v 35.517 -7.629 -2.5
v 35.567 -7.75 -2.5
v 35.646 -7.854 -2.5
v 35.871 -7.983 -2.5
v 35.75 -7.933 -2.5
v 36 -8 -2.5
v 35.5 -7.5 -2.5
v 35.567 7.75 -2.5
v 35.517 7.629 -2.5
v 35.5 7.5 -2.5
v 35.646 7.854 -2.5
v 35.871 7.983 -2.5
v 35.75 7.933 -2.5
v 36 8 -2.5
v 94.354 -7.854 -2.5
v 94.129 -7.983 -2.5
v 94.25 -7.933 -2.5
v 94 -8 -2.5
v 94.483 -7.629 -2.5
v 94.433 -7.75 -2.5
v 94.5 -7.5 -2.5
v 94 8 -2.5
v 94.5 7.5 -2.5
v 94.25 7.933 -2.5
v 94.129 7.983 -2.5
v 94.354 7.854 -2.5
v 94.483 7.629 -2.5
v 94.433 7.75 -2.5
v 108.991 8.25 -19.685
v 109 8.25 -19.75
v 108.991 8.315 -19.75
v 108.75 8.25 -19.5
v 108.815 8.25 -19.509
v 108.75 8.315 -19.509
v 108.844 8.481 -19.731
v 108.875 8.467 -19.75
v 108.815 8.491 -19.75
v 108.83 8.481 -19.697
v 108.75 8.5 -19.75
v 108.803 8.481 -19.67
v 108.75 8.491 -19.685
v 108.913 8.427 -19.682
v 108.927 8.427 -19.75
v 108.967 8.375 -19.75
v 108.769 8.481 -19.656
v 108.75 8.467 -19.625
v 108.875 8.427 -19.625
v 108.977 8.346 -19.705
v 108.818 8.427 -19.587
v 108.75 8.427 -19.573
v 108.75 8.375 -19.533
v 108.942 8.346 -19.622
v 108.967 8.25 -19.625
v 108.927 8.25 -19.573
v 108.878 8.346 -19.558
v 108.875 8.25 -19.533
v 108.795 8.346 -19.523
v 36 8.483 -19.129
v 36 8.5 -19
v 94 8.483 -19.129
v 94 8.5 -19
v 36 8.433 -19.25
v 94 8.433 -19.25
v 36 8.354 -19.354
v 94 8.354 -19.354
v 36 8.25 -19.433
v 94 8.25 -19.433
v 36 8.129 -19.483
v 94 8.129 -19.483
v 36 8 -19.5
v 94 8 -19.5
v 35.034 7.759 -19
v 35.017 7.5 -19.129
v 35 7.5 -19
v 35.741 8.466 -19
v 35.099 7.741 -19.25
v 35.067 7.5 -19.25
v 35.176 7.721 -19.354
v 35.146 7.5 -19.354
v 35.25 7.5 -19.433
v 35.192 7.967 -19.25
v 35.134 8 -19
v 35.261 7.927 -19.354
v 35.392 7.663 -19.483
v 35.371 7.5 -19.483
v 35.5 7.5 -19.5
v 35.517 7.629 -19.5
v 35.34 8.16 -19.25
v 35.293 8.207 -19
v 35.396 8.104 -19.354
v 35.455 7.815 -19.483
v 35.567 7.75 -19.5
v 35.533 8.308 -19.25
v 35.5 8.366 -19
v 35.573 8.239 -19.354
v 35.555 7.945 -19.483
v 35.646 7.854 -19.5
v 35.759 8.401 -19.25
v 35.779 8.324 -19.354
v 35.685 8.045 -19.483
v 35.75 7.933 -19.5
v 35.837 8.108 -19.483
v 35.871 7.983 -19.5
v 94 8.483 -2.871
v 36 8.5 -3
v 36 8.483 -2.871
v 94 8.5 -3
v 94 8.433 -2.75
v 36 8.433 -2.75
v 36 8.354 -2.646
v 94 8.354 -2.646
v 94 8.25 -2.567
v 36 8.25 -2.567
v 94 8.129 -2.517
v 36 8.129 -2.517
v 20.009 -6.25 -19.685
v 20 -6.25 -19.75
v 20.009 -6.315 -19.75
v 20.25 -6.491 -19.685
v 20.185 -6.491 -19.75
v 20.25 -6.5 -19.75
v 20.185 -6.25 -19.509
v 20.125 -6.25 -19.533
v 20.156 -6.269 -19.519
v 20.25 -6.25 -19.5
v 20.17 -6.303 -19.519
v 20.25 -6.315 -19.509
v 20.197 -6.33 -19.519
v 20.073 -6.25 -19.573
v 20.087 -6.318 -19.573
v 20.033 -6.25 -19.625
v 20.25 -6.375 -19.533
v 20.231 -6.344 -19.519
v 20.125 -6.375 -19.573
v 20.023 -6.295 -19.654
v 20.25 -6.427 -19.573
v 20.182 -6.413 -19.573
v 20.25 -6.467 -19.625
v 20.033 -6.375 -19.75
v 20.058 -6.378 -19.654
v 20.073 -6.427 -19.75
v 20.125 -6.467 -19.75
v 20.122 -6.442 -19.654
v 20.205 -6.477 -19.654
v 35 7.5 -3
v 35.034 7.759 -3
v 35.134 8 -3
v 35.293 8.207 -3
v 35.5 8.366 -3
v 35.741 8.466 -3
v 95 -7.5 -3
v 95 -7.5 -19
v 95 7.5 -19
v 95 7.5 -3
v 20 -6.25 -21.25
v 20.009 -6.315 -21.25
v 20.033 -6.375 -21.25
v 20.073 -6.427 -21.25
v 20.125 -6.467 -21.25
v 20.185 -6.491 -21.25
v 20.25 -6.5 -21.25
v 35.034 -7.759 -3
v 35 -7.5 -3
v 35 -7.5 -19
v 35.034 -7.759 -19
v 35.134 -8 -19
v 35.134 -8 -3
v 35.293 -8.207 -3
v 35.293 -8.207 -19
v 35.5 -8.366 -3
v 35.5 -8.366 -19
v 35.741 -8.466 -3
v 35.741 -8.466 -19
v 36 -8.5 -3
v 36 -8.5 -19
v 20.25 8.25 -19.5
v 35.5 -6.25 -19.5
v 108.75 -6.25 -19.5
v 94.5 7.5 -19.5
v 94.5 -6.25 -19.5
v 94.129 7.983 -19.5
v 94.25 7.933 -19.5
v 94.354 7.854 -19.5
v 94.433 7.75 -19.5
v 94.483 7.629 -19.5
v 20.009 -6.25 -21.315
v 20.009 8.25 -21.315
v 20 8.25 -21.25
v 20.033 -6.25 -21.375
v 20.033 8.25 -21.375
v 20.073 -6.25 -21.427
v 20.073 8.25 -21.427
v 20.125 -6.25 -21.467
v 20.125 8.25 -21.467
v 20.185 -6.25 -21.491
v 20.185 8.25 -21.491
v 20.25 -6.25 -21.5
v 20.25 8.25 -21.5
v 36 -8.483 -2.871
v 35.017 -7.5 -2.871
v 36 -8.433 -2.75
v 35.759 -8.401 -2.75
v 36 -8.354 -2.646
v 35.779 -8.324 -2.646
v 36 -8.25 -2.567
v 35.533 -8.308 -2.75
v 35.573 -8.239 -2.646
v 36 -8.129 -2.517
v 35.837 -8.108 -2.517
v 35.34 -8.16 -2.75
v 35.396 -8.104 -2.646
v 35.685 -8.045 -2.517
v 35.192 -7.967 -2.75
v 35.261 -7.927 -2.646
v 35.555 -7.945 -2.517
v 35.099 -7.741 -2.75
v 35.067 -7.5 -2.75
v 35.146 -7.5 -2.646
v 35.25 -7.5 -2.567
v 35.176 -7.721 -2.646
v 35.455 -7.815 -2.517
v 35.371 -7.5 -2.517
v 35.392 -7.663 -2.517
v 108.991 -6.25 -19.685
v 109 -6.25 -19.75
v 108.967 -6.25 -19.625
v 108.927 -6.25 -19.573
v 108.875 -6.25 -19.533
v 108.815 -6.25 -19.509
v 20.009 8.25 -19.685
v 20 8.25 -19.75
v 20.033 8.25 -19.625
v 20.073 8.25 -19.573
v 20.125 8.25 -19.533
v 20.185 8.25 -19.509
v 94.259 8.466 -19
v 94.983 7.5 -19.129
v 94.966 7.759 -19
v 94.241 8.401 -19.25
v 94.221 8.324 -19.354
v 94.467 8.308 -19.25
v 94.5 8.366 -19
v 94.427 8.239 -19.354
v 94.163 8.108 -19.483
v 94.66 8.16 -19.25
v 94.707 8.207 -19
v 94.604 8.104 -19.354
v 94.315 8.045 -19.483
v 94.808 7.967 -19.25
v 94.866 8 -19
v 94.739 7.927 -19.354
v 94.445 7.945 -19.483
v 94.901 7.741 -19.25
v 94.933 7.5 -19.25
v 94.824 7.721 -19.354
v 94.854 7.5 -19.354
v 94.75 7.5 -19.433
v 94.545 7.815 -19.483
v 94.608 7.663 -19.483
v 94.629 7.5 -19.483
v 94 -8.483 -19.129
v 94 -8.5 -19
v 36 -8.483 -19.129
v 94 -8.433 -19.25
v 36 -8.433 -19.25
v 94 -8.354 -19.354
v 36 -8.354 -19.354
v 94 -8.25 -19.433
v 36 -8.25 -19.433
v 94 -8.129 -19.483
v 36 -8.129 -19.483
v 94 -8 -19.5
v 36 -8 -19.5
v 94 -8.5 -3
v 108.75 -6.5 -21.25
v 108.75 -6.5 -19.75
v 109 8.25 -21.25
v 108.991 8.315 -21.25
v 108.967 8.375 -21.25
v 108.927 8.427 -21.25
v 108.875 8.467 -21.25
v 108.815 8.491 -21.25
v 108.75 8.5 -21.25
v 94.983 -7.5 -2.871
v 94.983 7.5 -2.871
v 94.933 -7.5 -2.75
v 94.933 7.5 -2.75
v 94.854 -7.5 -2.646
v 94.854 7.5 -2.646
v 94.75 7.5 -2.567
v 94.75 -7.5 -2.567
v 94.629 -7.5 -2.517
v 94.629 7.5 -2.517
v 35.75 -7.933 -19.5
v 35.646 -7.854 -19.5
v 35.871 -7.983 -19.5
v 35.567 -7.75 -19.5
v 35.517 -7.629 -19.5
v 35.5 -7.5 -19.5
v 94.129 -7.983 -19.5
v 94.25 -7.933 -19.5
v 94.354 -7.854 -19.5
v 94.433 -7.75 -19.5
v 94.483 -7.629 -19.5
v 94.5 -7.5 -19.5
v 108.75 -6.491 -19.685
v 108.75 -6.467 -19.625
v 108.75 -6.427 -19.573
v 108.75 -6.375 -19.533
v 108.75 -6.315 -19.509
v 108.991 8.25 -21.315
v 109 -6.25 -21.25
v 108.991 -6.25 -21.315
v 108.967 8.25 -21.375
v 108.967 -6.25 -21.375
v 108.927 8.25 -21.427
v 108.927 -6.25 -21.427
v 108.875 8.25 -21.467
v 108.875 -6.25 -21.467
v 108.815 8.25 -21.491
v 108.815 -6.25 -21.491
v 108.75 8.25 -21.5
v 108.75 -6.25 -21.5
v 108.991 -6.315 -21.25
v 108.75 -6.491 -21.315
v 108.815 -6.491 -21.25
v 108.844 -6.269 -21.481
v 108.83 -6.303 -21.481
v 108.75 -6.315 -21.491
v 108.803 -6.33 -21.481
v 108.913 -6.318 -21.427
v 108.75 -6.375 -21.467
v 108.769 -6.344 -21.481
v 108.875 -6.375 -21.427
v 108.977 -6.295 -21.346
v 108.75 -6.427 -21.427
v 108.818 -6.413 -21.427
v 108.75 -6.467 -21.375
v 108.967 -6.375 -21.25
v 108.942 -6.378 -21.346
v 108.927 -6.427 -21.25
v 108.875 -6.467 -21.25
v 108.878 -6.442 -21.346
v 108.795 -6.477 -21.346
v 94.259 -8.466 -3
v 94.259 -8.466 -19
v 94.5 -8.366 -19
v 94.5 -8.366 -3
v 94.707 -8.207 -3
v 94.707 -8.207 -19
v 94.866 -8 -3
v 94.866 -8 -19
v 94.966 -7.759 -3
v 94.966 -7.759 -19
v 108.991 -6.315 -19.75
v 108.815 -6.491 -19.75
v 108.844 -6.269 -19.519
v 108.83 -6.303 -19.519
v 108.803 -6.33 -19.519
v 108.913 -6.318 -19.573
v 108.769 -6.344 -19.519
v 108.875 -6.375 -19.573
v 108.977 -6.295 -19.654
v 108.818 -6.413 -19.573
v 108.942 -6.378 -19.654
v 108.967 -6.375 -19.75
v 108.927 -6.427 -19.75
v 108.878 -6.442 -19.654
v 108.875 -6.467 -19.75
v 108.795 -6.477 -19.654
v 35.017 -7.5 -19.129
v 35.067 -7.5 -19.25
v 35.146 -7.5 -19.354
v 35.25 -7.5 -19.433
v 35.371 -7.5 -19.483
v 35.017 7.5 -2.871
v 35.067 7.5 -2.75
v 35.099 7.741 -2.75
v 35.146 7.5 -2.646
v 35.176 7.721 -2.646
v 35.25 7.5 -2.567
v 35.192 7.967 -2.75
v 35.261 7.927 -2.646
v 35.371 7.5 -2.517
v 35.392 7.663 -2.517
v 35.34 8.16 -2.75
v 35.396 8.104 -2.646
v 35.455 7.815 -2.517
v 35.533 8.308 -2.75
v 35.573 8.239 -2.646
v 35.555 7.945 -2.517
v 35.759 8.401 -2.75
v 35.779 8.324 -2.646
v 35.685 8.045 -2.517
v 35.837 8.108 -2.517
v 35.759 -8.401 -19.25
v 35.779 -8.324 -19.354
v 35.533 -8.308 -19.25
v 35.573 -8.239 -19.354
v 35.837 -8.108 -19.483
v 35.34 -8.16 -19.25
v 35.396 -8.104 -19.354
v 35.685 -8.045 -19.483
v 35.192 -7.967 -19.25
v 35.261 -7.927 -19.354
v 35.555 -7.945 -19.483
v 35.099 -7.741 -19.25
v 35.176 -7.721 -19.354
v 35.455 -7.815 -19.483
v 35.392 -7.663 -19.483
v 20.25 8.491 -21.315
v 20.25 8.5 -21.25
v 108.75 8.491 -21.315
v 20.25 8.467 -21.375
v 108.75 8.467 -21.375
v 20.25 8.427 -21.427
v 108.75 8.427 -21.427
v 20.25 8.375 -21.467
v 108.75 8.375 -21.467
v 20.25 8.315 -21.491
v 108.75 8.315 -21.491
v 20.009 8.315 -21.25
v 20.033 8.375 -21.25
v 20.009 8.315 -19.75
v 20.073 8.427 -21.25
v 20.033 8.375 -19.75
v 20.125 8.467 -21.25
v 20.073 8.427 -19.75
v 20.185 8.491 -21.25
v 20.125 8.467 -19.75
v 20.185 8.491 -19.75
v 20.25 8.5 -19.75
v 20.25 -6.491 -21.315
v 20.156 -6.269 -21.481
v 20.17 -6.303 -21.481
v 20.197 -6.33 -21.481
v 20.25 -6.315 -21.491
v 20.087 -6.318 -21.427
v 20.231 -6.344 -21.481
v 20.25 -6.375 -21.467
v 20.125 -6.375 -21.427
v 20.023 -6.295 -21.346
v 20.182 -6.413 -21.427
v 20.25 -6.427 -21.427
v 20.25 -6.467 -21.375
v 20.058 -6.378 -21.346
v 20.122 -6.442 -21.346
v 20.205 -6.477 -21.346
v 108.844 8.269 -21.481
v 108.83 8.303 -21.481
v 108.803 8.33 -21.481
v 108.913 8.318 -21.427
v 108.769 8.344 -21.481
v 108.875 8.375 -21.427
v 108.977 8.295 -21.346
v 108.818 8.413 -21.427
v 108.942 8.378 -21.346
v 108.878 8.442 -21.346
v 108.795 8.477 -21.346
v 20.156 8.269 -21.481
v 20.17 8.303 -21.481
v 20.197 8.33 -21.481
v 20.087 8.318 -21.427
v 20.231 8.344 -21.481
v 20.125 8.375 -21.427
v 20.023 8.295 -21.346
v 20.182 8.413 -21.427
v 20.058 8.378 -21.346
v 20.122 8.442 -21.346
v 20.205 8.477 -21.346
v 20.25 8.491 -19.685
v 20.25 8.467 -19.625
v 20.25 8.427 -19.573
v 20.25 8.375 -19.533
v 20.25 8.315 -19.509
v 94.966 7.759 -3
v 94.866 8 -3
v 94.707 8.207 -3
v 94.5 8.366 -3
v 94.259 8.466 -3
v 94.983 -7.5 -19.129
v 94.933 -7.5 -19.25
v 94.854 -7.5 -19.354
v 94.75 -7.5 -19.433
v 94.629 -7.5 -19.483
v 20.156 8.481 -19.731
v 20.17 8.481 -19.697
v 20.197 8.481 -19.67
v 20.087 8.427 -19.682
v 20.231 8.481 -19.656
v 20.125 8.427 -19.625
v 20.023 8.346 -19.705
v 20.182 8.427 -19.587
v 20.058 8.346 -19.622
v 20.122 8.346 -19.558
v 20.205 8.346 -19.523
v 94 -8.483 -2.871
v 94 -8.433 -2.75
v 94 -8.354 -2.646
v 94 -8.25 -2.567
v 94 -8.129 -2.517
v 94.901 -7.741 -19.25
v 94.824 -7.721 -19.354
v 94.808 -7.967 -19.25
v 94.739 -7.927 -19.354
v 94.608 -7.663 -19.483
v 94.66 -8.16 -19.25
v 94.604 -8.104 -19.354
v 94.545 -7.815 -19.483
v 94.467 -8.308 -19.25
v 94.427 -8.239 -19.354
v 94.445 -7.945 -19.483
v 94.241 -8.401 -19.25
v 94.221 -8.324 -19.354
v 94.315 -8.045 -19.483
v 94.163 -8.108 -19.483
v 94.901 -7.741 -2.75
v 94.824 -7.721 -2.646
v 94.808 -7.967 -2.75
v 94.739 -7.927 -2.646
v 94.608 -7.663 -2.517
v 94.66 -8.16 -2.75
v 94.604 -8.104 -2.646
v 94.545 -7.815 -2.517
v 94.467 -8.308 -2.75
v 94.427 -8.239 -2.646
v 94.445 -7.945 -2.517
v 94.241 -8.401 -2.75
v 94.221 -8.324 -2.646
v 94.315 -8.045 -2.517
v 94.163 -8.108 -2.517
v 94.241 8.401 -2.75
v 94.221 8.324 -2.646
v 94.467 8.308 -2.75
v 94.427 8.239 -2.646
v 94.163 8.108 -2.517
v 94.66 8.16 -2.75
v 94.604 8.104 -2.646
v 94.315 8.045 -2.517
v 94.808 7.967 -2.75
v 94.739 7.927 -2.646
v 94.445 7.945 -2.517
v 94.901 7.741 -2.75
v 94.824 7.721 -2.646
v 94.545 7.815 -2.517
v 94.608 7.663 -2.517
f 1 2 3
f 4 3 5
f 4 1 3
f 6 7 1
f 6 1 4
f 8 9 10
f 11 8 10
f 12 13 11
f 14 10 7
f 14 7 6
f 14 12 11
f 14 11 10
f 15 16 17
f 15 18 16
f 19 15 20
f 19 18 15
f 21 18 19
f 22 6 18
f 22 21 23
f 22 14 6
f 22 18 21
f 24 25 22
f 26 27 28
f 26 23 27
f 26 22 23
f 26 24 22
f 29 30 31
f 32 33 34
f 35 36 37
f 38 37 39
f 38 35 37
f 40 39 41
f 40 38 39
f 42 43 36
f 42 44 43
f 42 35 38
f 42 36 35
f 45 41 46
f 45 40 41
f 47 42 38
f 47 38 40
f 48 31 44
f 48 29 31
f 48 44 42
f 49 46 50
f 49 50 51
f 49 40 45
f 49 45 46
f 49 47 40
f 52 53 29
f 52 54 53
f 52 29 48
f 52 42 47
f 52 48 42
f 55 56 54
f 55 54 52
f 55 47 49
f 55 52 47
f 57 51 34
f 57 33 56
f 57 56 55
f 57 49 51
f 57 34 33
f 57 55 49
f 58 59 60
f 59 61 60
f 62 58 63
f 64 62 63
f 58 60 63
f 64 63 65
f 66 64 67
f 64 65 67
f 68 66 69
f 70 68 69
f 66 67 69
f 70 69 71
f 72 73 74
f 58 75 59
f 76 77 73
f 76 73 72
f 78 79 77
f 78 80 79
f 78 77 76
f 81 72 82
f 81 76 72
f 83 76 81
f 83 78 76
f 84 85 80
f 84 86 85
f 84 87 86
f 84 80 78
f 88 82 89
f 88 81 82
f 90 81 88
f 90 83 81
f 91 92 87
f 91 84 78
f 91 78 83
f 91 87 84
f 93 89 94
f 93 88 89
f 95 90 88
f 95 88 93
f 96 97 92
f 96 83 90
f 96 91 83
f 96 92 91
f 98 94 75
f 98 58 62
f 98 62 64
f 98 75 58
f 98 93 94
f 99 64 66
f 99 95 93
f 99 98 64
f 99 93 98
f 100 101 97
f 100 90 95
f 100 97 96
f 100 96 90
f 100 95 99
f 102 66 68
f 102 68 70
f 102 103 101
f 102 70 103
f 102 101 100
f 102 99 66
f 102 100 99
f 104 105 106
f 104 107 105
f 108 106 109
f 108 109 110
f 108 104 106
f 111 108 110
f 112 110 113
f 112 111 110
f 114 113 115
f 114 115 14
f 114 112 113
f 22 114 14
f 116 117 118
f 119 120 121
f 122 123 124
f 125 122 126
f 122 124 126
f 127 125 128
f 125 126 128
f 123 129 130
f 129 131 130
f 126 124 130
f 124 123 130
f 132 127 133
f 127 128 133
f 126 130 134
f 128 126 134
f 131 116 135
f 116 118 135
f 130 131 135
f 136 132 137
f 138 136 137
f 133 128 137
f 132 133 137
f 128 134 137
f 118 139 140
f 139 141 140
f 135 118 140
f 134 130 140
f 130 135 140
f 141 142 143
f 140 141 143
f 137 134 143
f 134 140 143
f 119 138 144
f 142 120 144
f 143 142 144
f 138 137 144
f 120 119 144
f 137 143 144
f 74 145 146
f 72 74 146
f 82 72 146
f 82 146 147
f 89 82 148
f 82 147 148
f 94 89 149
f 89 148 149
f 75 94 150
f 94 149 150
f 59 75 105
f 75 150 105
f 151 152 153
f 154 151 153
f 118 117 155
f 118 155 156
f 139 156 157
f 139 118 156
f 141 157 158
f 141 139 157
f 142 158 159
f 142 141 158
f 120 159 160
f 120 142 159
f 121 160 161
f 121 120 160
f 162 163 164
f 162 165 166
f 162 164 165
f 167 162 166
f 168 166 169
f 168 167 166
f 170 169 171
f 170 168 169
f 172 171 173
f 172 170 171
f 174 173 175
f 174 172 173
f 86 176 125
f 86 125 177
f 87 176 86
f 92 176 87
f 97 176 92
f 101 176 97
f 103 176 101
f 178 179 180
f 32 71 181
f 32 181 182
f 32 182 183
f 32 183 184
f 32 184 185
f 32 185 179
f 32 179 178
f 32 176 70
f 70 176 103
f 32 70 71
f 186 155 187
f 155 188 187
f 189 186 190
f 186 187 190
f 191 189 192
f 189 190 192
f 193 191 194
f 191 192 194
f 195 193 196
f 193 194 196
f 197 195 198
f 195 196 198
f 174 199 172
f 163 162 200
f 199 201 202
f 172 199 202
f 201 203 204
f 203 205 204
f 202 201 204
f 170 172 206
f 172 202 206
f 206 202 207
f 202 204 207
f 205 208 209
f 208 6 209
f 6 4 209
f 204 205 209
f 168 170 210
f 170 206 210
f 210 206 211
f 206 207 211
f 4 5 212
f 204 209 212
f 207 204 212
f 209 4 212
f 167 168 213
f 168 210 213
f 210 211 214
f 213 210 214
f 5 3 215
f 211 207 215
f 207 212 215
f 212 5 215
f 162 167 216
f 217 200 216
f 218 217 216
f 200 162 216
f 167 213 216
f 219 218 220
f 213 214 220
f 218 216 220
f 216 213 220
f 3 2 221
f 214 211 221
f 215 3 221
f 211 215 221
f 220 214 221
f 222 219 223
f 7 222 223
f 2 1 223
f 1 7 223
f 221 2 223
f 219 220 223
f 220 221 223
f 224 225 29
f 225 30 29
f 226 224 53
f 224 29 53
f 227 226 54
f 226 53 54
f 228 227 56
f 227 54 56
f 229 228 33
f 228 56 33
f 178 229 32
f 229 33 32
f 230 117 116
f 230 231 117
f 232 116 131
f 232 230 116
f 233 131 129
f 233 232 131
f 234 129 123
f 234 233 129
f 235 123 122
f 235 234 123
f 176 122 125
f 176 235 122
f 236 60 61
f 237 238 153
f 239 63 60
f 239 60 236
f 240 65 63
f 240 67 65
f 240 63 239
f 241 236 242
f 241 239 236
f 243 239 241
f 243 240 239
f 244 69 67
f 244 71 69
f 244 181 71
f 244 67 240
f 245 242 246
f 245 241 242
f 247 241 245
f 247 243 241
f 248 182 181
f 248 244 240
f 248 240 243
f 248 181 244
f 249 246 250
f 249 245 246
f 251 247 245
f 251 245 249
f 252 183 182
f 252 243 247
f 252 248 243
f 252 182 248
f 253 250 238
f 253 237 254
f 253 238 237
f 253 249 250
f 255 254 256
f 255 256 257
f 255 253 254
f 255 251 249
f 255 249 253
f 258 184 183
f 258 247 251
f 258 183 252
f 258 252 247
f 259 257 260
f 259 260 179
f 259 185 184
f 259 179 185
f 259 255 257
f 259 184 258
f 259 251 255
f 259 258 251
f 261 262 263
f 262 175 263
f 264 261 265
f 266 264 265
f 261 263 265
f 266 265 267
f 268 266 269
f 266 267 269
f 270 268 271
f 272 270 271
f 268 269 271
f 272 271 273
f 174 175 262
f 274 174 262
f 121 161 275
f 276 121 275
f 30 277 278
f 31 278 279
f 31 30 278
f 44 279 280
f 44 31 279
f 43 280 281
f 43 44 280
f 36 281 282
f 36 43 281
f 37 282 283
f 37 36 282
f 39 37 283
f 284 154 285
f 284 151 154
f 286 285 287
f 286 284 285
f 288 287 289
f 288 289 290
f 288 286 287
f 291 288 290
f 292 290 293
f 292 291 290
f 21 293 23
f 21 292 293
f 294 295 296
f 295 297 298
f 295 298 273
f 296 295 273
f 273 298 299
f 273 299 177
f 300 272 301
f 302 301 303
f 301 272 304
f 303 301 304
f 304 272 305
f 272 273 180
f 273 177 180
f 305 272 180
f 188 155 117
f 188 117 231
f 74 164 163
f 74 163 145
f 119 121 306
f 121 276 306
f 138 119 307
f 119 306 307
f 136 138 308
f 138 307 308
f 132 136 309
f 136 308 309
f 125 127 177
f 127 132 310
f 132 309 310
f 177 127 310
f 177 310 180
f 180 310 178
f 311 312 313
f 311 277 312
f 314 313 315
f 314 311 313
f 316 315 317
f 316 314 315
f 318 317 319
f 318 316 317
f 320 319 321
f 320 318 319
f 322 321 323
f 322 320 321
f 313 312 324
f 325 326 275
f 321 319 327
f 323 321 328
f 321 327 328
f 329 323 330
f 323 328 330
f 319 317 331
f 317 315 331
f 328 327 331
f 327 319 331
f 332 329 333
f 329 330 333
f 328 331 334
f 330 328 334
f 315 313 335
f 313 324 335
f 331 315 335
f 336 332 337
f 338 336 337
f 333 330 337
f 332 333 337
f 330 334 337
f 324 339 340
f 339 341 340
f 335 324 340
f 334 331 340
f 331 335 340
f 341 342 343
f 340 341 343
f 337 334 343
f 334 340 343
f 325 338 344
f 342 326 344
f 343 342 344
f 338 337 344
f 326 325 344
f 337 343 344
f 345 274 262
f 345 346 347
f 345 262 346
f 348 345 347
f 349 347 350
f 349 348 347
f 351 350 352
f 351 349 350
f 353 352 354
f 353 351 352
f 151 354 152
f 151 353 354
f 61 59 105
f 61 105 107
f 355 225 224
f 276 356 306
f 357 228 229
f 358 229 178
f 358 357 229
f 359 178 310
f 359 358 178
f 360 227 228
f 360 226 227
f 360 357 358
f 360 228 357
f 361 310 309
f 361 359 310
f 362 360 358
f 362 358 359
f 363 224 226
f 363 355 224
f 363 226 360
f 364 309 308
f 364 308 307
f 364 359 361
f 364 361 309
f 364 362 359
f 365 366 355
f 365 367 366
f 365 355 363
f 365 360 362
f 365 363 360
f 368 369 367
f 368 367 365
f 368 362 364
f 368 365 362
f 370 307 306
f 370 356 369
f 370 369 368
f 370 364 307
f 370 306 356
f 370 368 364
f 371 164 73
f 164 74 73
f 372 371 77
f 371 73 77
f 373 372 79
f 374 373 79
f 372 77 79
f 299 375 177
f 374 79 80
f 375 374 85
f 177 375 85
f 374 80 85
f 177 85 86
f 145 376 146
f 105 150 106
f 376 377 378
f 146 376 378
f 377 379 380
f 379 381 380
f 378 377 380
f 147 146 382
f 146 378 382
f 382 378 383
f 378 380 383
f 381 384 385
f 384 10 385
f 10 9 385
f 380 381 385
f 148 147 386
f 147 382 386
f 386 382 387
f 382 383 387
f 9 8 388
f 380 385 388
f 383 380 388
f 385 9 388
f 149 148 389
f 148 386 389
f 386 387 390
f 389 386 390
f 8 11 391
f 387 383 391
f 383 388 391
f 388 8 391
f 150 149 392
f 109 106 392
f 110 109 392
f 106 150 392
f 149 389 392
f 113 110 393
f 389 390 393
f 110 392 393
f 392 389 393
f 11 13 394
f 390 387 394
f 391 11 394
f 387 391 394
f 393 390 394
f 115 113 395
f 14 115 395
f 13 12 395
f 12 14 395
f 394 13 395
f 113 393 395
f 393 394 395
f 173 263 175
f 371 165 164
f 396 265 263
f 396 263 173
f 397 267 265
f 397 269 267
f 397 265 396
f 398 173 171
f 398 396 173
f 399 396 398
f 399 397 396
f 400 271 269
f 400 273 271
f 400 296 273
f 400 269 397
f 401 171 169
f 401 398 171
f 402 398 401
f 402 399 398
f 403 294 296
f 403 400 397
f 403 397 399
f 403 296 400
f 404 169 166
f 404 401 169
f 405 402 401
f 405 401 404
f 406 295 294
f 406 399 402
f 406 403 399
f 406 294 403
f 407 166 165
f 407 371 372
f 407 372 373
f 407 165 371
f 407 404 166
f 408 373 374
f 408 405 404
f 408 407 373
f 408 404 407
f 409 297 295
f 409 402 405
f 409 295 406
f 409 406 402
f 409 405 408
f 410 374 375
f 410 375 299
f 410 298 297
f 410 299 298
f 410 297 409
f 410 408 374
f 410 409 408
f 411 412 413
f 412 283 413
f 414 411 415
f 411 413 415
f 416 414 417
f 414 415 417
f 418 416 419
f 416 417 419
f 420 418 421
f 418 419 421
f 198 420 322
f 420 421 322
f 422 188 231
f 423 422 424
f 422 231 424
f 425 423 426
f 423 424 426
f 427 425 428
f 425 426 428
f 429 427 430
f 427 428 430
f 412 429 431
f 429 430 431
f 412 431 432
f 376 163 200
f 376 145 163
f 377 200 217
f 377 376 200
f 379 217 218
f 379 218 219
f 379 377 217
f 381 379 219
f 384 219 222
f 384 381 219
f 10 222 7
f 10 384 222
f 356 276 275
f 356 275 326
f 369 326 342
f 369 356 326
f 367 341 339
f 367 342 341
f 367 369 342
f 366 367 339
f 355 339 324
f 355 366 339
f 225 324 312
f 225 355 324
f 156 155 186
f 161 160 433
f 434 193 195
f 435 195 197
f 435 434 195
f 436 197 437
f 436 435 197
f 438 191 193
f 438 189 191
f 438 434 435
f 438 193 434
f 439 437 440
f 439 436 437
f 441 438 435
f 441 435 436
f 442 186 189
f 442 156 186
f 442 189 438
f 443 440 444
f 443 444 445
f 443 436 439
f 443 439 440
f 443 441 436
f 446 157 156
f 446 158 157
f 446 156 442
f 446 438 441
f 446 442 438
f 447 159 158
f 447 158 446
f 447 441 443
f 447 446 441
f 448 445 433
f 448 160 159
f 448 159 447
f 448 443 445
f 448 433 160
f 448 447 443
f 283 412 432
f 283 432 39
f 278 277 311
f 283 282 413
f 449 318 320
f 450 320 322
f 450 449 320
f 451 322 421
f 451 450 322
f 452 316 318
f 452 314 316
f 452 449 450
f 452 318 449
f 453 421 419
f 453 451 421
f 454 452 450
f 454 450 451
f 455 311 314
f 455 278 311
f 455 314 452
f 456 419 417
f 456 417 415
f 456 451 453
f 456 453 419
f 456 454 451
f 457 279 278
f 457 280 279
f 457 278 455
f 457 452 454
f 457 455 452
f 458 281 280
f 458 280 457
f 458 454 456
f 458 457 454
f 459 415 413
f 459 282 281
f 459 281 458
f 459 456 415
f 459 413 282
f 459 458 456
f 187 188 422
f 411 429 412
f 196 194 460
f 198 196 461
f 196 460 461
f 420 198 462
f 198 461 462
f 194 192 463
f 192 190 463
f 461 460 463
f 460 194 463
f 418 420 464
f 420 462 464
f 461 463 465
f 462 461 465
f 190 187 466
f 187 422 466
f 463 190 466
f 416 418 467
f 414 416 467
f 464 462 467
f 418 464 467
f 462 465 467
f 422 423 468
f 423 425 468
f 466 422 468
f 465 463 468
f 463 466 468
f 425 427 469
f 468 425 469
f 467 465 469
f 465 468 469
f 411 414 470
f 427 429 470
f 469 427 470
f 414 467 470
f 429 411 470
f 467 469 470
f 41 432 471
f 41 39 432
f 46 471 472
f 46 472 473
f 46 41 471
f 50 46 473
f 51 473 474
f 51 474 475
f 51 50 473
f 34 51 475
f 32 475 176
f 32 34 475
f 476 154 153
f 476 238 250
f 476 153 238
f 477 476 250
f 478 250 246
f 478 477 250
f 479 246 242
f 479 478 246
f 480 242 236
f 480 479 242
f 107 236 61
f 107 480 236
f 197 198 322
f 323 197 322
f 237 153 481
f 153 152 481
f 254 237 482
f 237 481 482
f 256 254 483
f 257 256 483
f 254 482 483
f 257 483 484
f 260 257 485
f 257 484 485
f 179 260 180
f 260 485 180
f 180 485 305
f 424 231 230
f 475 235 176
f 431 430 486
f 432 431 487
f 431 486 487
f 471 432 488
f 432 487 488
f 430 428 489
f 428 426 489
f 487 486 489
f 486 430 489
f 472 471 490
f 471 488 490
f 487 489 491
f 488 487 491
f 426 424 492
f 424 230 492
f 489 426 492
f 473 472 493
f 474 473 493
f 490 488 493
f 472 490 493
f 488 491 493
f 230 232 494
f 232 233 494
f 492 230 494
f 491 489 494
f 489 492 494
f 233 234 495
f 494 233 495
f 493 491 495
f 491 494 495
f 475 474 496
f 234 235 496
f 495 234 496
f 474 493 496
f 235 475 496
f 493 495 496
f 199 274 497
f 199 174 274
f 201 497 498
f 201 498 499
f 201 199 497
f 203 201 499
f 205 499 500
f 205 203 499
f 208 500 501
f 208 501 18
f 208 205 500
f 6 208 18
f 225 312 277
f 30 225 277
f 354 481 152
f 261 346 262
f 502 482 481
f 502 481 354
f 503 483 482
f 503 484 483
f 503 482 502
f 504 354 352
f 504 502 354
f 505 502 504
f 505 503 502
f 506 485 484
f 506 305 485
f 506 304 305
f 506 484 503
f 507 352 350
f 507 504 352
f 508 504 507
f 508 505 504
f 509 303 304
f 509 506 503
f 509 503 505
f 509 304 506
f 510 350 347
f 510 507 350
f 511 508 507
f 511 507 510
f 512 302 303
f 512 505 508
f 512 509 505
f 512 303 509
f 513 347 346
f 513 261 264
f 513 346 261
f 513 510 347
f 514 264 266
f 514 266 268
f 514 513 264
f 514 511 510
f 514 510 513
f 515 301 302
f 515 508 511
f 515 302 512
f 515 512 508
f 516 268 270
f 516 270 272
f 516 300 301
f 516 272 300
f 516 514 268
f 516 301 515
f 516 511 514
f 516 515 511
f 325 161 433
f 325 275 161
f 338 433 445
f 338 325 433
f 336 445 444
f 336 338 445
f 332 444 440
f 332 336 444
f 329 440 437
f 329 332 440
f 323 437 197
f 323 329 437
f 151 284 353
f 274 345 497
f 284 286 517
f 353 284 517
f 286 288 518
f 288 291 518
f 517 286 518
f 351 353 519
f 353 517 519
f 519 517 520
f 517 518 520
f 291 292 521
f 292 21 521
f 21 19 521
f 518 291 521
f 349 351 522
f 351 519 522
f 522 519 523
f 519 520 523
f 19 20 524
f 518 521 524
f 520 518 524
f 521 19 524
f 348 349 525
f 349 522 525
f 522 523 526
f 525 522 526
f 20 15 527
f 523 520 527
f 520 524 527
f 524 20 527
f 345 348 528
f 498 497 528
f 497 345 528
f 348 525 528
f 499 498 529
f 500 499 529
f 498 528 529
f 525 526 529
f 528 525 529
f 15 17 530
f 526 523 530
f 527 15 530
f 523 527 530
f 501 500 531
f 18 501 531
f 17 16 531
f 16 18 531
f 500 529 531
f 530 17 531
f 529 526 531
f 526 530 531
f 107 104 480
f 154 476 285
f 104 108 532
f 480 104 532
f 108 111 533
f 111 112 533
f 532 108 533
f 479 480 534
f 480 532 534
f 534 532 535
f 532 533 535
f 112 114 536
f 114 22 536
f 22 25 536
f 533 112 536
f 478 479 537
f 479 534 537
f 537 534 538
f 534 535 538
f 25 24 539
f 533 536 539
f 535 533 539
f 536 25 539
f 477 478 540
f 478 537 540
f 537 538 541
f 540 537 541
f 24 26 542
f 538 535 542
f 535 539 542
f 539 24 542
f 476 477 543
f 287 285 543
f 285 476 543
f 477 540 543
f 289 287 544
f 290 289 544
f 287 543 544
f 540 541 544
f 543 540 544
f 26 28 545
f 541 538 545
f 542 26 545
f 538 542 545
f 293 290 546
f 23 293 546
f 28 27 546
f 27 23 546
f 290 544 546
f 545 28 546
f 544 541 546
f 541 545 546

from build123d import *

# Parameters (mm, degrees)
BOX_W        = 60
BOX_H        = 17
BOX_DEPTH    = 17
FILLET001_R  = 1
FILLET002_R  = 0.5
BOX008_W     = 89
BOX008_H     = 15
BOX008_DEPTH = 2
FILLET003_R  = 0.25


with BuildPart() as vrm_cooler_body:
    # Box → Box (new body)
    with BuildSketch(Plane(origin=(0, -8.5, -17), x_dir=(1, 0, 0), z_dir=(0, 0, 1))):
        with Locations((30, 8.5)):
            Rectangle(BOX_W, BOX_H)
    extrude(amount=BOX_DEPTH)

    # Fillet001
    fillet001_edges = [vrm_cooler_body.edges().sort_by_distance(p)[0] for p in [
        (0, -8.5, -8.5),
        (0, 8.5, -8.5),
        (60, -8.5, -8.5),
        (60, 8.5, -8.5),
    ]]
    fillet(fillet001_edges, radius=FILLET001_R)

    # Fillet002
    fillet002_edges = [vrm_cooler_body.edges().sort_by_distance(p)[0] for p in [
        (0, 0, 0),
        (0, 0, -17),
        (30, -8.5, 0),
        (30, 8.5, 0),
        (60, 0, 0),
        (30, -8.5, -17),
        (30, 8.5, -17),
        (60, 0, -17),
    ]]
    fillet(fillet002_edges, radius=FILLET002_R)


with BuildPart() as vrm_cooler_body_1:
    # Fillet002 placement: moved
    add(vrm_cooler_body.part.moved(Location((35, 0, -2.5))))


with BuildPart() as fusion035:
    # Box008 → Box008 (new body)
    with BuildSketch(Plane(origin=(0, -6.5, -2), x_dir=(1, 0, 0), z_dir=(0, 0, 1))):
        with Locations((44.5, 7.5)):
            Rectangle(BOX008_W, BOX008_H)
    extrude(amount=BOX008_DEPTH)

    # Fillet003
    fillet003_edges = [fusion035.edges().sort_by_distance(p)[0] for p in [
        (0, -6.5, -1),
        (0, 1, 0),
        (0, 8.5, -1),
        (0, 1, -2),
        (89, -6.5, -1),
        (89, 1, 0),
        (89, 8.5, -1),
        (89, 1, -2),
        (44.5, -6.5, -2),
        (44.5, -6.5, 0),
        (44.5, 8.5, -2),
        (44.5, 8.5, 0),
    ]]
    fillet(fillet003_edges, radius=FILLET003_R)


with BuildPart() as fusion035_1:
    # Fillet003 placement: moved
    add(fusion035.part.moved(Location((20, 0, -19.5))))

    # Fusion035: union VRM-Cooler-Body
    add(vrm_cooler_body_1.part)


solid = fusion035_1.part
